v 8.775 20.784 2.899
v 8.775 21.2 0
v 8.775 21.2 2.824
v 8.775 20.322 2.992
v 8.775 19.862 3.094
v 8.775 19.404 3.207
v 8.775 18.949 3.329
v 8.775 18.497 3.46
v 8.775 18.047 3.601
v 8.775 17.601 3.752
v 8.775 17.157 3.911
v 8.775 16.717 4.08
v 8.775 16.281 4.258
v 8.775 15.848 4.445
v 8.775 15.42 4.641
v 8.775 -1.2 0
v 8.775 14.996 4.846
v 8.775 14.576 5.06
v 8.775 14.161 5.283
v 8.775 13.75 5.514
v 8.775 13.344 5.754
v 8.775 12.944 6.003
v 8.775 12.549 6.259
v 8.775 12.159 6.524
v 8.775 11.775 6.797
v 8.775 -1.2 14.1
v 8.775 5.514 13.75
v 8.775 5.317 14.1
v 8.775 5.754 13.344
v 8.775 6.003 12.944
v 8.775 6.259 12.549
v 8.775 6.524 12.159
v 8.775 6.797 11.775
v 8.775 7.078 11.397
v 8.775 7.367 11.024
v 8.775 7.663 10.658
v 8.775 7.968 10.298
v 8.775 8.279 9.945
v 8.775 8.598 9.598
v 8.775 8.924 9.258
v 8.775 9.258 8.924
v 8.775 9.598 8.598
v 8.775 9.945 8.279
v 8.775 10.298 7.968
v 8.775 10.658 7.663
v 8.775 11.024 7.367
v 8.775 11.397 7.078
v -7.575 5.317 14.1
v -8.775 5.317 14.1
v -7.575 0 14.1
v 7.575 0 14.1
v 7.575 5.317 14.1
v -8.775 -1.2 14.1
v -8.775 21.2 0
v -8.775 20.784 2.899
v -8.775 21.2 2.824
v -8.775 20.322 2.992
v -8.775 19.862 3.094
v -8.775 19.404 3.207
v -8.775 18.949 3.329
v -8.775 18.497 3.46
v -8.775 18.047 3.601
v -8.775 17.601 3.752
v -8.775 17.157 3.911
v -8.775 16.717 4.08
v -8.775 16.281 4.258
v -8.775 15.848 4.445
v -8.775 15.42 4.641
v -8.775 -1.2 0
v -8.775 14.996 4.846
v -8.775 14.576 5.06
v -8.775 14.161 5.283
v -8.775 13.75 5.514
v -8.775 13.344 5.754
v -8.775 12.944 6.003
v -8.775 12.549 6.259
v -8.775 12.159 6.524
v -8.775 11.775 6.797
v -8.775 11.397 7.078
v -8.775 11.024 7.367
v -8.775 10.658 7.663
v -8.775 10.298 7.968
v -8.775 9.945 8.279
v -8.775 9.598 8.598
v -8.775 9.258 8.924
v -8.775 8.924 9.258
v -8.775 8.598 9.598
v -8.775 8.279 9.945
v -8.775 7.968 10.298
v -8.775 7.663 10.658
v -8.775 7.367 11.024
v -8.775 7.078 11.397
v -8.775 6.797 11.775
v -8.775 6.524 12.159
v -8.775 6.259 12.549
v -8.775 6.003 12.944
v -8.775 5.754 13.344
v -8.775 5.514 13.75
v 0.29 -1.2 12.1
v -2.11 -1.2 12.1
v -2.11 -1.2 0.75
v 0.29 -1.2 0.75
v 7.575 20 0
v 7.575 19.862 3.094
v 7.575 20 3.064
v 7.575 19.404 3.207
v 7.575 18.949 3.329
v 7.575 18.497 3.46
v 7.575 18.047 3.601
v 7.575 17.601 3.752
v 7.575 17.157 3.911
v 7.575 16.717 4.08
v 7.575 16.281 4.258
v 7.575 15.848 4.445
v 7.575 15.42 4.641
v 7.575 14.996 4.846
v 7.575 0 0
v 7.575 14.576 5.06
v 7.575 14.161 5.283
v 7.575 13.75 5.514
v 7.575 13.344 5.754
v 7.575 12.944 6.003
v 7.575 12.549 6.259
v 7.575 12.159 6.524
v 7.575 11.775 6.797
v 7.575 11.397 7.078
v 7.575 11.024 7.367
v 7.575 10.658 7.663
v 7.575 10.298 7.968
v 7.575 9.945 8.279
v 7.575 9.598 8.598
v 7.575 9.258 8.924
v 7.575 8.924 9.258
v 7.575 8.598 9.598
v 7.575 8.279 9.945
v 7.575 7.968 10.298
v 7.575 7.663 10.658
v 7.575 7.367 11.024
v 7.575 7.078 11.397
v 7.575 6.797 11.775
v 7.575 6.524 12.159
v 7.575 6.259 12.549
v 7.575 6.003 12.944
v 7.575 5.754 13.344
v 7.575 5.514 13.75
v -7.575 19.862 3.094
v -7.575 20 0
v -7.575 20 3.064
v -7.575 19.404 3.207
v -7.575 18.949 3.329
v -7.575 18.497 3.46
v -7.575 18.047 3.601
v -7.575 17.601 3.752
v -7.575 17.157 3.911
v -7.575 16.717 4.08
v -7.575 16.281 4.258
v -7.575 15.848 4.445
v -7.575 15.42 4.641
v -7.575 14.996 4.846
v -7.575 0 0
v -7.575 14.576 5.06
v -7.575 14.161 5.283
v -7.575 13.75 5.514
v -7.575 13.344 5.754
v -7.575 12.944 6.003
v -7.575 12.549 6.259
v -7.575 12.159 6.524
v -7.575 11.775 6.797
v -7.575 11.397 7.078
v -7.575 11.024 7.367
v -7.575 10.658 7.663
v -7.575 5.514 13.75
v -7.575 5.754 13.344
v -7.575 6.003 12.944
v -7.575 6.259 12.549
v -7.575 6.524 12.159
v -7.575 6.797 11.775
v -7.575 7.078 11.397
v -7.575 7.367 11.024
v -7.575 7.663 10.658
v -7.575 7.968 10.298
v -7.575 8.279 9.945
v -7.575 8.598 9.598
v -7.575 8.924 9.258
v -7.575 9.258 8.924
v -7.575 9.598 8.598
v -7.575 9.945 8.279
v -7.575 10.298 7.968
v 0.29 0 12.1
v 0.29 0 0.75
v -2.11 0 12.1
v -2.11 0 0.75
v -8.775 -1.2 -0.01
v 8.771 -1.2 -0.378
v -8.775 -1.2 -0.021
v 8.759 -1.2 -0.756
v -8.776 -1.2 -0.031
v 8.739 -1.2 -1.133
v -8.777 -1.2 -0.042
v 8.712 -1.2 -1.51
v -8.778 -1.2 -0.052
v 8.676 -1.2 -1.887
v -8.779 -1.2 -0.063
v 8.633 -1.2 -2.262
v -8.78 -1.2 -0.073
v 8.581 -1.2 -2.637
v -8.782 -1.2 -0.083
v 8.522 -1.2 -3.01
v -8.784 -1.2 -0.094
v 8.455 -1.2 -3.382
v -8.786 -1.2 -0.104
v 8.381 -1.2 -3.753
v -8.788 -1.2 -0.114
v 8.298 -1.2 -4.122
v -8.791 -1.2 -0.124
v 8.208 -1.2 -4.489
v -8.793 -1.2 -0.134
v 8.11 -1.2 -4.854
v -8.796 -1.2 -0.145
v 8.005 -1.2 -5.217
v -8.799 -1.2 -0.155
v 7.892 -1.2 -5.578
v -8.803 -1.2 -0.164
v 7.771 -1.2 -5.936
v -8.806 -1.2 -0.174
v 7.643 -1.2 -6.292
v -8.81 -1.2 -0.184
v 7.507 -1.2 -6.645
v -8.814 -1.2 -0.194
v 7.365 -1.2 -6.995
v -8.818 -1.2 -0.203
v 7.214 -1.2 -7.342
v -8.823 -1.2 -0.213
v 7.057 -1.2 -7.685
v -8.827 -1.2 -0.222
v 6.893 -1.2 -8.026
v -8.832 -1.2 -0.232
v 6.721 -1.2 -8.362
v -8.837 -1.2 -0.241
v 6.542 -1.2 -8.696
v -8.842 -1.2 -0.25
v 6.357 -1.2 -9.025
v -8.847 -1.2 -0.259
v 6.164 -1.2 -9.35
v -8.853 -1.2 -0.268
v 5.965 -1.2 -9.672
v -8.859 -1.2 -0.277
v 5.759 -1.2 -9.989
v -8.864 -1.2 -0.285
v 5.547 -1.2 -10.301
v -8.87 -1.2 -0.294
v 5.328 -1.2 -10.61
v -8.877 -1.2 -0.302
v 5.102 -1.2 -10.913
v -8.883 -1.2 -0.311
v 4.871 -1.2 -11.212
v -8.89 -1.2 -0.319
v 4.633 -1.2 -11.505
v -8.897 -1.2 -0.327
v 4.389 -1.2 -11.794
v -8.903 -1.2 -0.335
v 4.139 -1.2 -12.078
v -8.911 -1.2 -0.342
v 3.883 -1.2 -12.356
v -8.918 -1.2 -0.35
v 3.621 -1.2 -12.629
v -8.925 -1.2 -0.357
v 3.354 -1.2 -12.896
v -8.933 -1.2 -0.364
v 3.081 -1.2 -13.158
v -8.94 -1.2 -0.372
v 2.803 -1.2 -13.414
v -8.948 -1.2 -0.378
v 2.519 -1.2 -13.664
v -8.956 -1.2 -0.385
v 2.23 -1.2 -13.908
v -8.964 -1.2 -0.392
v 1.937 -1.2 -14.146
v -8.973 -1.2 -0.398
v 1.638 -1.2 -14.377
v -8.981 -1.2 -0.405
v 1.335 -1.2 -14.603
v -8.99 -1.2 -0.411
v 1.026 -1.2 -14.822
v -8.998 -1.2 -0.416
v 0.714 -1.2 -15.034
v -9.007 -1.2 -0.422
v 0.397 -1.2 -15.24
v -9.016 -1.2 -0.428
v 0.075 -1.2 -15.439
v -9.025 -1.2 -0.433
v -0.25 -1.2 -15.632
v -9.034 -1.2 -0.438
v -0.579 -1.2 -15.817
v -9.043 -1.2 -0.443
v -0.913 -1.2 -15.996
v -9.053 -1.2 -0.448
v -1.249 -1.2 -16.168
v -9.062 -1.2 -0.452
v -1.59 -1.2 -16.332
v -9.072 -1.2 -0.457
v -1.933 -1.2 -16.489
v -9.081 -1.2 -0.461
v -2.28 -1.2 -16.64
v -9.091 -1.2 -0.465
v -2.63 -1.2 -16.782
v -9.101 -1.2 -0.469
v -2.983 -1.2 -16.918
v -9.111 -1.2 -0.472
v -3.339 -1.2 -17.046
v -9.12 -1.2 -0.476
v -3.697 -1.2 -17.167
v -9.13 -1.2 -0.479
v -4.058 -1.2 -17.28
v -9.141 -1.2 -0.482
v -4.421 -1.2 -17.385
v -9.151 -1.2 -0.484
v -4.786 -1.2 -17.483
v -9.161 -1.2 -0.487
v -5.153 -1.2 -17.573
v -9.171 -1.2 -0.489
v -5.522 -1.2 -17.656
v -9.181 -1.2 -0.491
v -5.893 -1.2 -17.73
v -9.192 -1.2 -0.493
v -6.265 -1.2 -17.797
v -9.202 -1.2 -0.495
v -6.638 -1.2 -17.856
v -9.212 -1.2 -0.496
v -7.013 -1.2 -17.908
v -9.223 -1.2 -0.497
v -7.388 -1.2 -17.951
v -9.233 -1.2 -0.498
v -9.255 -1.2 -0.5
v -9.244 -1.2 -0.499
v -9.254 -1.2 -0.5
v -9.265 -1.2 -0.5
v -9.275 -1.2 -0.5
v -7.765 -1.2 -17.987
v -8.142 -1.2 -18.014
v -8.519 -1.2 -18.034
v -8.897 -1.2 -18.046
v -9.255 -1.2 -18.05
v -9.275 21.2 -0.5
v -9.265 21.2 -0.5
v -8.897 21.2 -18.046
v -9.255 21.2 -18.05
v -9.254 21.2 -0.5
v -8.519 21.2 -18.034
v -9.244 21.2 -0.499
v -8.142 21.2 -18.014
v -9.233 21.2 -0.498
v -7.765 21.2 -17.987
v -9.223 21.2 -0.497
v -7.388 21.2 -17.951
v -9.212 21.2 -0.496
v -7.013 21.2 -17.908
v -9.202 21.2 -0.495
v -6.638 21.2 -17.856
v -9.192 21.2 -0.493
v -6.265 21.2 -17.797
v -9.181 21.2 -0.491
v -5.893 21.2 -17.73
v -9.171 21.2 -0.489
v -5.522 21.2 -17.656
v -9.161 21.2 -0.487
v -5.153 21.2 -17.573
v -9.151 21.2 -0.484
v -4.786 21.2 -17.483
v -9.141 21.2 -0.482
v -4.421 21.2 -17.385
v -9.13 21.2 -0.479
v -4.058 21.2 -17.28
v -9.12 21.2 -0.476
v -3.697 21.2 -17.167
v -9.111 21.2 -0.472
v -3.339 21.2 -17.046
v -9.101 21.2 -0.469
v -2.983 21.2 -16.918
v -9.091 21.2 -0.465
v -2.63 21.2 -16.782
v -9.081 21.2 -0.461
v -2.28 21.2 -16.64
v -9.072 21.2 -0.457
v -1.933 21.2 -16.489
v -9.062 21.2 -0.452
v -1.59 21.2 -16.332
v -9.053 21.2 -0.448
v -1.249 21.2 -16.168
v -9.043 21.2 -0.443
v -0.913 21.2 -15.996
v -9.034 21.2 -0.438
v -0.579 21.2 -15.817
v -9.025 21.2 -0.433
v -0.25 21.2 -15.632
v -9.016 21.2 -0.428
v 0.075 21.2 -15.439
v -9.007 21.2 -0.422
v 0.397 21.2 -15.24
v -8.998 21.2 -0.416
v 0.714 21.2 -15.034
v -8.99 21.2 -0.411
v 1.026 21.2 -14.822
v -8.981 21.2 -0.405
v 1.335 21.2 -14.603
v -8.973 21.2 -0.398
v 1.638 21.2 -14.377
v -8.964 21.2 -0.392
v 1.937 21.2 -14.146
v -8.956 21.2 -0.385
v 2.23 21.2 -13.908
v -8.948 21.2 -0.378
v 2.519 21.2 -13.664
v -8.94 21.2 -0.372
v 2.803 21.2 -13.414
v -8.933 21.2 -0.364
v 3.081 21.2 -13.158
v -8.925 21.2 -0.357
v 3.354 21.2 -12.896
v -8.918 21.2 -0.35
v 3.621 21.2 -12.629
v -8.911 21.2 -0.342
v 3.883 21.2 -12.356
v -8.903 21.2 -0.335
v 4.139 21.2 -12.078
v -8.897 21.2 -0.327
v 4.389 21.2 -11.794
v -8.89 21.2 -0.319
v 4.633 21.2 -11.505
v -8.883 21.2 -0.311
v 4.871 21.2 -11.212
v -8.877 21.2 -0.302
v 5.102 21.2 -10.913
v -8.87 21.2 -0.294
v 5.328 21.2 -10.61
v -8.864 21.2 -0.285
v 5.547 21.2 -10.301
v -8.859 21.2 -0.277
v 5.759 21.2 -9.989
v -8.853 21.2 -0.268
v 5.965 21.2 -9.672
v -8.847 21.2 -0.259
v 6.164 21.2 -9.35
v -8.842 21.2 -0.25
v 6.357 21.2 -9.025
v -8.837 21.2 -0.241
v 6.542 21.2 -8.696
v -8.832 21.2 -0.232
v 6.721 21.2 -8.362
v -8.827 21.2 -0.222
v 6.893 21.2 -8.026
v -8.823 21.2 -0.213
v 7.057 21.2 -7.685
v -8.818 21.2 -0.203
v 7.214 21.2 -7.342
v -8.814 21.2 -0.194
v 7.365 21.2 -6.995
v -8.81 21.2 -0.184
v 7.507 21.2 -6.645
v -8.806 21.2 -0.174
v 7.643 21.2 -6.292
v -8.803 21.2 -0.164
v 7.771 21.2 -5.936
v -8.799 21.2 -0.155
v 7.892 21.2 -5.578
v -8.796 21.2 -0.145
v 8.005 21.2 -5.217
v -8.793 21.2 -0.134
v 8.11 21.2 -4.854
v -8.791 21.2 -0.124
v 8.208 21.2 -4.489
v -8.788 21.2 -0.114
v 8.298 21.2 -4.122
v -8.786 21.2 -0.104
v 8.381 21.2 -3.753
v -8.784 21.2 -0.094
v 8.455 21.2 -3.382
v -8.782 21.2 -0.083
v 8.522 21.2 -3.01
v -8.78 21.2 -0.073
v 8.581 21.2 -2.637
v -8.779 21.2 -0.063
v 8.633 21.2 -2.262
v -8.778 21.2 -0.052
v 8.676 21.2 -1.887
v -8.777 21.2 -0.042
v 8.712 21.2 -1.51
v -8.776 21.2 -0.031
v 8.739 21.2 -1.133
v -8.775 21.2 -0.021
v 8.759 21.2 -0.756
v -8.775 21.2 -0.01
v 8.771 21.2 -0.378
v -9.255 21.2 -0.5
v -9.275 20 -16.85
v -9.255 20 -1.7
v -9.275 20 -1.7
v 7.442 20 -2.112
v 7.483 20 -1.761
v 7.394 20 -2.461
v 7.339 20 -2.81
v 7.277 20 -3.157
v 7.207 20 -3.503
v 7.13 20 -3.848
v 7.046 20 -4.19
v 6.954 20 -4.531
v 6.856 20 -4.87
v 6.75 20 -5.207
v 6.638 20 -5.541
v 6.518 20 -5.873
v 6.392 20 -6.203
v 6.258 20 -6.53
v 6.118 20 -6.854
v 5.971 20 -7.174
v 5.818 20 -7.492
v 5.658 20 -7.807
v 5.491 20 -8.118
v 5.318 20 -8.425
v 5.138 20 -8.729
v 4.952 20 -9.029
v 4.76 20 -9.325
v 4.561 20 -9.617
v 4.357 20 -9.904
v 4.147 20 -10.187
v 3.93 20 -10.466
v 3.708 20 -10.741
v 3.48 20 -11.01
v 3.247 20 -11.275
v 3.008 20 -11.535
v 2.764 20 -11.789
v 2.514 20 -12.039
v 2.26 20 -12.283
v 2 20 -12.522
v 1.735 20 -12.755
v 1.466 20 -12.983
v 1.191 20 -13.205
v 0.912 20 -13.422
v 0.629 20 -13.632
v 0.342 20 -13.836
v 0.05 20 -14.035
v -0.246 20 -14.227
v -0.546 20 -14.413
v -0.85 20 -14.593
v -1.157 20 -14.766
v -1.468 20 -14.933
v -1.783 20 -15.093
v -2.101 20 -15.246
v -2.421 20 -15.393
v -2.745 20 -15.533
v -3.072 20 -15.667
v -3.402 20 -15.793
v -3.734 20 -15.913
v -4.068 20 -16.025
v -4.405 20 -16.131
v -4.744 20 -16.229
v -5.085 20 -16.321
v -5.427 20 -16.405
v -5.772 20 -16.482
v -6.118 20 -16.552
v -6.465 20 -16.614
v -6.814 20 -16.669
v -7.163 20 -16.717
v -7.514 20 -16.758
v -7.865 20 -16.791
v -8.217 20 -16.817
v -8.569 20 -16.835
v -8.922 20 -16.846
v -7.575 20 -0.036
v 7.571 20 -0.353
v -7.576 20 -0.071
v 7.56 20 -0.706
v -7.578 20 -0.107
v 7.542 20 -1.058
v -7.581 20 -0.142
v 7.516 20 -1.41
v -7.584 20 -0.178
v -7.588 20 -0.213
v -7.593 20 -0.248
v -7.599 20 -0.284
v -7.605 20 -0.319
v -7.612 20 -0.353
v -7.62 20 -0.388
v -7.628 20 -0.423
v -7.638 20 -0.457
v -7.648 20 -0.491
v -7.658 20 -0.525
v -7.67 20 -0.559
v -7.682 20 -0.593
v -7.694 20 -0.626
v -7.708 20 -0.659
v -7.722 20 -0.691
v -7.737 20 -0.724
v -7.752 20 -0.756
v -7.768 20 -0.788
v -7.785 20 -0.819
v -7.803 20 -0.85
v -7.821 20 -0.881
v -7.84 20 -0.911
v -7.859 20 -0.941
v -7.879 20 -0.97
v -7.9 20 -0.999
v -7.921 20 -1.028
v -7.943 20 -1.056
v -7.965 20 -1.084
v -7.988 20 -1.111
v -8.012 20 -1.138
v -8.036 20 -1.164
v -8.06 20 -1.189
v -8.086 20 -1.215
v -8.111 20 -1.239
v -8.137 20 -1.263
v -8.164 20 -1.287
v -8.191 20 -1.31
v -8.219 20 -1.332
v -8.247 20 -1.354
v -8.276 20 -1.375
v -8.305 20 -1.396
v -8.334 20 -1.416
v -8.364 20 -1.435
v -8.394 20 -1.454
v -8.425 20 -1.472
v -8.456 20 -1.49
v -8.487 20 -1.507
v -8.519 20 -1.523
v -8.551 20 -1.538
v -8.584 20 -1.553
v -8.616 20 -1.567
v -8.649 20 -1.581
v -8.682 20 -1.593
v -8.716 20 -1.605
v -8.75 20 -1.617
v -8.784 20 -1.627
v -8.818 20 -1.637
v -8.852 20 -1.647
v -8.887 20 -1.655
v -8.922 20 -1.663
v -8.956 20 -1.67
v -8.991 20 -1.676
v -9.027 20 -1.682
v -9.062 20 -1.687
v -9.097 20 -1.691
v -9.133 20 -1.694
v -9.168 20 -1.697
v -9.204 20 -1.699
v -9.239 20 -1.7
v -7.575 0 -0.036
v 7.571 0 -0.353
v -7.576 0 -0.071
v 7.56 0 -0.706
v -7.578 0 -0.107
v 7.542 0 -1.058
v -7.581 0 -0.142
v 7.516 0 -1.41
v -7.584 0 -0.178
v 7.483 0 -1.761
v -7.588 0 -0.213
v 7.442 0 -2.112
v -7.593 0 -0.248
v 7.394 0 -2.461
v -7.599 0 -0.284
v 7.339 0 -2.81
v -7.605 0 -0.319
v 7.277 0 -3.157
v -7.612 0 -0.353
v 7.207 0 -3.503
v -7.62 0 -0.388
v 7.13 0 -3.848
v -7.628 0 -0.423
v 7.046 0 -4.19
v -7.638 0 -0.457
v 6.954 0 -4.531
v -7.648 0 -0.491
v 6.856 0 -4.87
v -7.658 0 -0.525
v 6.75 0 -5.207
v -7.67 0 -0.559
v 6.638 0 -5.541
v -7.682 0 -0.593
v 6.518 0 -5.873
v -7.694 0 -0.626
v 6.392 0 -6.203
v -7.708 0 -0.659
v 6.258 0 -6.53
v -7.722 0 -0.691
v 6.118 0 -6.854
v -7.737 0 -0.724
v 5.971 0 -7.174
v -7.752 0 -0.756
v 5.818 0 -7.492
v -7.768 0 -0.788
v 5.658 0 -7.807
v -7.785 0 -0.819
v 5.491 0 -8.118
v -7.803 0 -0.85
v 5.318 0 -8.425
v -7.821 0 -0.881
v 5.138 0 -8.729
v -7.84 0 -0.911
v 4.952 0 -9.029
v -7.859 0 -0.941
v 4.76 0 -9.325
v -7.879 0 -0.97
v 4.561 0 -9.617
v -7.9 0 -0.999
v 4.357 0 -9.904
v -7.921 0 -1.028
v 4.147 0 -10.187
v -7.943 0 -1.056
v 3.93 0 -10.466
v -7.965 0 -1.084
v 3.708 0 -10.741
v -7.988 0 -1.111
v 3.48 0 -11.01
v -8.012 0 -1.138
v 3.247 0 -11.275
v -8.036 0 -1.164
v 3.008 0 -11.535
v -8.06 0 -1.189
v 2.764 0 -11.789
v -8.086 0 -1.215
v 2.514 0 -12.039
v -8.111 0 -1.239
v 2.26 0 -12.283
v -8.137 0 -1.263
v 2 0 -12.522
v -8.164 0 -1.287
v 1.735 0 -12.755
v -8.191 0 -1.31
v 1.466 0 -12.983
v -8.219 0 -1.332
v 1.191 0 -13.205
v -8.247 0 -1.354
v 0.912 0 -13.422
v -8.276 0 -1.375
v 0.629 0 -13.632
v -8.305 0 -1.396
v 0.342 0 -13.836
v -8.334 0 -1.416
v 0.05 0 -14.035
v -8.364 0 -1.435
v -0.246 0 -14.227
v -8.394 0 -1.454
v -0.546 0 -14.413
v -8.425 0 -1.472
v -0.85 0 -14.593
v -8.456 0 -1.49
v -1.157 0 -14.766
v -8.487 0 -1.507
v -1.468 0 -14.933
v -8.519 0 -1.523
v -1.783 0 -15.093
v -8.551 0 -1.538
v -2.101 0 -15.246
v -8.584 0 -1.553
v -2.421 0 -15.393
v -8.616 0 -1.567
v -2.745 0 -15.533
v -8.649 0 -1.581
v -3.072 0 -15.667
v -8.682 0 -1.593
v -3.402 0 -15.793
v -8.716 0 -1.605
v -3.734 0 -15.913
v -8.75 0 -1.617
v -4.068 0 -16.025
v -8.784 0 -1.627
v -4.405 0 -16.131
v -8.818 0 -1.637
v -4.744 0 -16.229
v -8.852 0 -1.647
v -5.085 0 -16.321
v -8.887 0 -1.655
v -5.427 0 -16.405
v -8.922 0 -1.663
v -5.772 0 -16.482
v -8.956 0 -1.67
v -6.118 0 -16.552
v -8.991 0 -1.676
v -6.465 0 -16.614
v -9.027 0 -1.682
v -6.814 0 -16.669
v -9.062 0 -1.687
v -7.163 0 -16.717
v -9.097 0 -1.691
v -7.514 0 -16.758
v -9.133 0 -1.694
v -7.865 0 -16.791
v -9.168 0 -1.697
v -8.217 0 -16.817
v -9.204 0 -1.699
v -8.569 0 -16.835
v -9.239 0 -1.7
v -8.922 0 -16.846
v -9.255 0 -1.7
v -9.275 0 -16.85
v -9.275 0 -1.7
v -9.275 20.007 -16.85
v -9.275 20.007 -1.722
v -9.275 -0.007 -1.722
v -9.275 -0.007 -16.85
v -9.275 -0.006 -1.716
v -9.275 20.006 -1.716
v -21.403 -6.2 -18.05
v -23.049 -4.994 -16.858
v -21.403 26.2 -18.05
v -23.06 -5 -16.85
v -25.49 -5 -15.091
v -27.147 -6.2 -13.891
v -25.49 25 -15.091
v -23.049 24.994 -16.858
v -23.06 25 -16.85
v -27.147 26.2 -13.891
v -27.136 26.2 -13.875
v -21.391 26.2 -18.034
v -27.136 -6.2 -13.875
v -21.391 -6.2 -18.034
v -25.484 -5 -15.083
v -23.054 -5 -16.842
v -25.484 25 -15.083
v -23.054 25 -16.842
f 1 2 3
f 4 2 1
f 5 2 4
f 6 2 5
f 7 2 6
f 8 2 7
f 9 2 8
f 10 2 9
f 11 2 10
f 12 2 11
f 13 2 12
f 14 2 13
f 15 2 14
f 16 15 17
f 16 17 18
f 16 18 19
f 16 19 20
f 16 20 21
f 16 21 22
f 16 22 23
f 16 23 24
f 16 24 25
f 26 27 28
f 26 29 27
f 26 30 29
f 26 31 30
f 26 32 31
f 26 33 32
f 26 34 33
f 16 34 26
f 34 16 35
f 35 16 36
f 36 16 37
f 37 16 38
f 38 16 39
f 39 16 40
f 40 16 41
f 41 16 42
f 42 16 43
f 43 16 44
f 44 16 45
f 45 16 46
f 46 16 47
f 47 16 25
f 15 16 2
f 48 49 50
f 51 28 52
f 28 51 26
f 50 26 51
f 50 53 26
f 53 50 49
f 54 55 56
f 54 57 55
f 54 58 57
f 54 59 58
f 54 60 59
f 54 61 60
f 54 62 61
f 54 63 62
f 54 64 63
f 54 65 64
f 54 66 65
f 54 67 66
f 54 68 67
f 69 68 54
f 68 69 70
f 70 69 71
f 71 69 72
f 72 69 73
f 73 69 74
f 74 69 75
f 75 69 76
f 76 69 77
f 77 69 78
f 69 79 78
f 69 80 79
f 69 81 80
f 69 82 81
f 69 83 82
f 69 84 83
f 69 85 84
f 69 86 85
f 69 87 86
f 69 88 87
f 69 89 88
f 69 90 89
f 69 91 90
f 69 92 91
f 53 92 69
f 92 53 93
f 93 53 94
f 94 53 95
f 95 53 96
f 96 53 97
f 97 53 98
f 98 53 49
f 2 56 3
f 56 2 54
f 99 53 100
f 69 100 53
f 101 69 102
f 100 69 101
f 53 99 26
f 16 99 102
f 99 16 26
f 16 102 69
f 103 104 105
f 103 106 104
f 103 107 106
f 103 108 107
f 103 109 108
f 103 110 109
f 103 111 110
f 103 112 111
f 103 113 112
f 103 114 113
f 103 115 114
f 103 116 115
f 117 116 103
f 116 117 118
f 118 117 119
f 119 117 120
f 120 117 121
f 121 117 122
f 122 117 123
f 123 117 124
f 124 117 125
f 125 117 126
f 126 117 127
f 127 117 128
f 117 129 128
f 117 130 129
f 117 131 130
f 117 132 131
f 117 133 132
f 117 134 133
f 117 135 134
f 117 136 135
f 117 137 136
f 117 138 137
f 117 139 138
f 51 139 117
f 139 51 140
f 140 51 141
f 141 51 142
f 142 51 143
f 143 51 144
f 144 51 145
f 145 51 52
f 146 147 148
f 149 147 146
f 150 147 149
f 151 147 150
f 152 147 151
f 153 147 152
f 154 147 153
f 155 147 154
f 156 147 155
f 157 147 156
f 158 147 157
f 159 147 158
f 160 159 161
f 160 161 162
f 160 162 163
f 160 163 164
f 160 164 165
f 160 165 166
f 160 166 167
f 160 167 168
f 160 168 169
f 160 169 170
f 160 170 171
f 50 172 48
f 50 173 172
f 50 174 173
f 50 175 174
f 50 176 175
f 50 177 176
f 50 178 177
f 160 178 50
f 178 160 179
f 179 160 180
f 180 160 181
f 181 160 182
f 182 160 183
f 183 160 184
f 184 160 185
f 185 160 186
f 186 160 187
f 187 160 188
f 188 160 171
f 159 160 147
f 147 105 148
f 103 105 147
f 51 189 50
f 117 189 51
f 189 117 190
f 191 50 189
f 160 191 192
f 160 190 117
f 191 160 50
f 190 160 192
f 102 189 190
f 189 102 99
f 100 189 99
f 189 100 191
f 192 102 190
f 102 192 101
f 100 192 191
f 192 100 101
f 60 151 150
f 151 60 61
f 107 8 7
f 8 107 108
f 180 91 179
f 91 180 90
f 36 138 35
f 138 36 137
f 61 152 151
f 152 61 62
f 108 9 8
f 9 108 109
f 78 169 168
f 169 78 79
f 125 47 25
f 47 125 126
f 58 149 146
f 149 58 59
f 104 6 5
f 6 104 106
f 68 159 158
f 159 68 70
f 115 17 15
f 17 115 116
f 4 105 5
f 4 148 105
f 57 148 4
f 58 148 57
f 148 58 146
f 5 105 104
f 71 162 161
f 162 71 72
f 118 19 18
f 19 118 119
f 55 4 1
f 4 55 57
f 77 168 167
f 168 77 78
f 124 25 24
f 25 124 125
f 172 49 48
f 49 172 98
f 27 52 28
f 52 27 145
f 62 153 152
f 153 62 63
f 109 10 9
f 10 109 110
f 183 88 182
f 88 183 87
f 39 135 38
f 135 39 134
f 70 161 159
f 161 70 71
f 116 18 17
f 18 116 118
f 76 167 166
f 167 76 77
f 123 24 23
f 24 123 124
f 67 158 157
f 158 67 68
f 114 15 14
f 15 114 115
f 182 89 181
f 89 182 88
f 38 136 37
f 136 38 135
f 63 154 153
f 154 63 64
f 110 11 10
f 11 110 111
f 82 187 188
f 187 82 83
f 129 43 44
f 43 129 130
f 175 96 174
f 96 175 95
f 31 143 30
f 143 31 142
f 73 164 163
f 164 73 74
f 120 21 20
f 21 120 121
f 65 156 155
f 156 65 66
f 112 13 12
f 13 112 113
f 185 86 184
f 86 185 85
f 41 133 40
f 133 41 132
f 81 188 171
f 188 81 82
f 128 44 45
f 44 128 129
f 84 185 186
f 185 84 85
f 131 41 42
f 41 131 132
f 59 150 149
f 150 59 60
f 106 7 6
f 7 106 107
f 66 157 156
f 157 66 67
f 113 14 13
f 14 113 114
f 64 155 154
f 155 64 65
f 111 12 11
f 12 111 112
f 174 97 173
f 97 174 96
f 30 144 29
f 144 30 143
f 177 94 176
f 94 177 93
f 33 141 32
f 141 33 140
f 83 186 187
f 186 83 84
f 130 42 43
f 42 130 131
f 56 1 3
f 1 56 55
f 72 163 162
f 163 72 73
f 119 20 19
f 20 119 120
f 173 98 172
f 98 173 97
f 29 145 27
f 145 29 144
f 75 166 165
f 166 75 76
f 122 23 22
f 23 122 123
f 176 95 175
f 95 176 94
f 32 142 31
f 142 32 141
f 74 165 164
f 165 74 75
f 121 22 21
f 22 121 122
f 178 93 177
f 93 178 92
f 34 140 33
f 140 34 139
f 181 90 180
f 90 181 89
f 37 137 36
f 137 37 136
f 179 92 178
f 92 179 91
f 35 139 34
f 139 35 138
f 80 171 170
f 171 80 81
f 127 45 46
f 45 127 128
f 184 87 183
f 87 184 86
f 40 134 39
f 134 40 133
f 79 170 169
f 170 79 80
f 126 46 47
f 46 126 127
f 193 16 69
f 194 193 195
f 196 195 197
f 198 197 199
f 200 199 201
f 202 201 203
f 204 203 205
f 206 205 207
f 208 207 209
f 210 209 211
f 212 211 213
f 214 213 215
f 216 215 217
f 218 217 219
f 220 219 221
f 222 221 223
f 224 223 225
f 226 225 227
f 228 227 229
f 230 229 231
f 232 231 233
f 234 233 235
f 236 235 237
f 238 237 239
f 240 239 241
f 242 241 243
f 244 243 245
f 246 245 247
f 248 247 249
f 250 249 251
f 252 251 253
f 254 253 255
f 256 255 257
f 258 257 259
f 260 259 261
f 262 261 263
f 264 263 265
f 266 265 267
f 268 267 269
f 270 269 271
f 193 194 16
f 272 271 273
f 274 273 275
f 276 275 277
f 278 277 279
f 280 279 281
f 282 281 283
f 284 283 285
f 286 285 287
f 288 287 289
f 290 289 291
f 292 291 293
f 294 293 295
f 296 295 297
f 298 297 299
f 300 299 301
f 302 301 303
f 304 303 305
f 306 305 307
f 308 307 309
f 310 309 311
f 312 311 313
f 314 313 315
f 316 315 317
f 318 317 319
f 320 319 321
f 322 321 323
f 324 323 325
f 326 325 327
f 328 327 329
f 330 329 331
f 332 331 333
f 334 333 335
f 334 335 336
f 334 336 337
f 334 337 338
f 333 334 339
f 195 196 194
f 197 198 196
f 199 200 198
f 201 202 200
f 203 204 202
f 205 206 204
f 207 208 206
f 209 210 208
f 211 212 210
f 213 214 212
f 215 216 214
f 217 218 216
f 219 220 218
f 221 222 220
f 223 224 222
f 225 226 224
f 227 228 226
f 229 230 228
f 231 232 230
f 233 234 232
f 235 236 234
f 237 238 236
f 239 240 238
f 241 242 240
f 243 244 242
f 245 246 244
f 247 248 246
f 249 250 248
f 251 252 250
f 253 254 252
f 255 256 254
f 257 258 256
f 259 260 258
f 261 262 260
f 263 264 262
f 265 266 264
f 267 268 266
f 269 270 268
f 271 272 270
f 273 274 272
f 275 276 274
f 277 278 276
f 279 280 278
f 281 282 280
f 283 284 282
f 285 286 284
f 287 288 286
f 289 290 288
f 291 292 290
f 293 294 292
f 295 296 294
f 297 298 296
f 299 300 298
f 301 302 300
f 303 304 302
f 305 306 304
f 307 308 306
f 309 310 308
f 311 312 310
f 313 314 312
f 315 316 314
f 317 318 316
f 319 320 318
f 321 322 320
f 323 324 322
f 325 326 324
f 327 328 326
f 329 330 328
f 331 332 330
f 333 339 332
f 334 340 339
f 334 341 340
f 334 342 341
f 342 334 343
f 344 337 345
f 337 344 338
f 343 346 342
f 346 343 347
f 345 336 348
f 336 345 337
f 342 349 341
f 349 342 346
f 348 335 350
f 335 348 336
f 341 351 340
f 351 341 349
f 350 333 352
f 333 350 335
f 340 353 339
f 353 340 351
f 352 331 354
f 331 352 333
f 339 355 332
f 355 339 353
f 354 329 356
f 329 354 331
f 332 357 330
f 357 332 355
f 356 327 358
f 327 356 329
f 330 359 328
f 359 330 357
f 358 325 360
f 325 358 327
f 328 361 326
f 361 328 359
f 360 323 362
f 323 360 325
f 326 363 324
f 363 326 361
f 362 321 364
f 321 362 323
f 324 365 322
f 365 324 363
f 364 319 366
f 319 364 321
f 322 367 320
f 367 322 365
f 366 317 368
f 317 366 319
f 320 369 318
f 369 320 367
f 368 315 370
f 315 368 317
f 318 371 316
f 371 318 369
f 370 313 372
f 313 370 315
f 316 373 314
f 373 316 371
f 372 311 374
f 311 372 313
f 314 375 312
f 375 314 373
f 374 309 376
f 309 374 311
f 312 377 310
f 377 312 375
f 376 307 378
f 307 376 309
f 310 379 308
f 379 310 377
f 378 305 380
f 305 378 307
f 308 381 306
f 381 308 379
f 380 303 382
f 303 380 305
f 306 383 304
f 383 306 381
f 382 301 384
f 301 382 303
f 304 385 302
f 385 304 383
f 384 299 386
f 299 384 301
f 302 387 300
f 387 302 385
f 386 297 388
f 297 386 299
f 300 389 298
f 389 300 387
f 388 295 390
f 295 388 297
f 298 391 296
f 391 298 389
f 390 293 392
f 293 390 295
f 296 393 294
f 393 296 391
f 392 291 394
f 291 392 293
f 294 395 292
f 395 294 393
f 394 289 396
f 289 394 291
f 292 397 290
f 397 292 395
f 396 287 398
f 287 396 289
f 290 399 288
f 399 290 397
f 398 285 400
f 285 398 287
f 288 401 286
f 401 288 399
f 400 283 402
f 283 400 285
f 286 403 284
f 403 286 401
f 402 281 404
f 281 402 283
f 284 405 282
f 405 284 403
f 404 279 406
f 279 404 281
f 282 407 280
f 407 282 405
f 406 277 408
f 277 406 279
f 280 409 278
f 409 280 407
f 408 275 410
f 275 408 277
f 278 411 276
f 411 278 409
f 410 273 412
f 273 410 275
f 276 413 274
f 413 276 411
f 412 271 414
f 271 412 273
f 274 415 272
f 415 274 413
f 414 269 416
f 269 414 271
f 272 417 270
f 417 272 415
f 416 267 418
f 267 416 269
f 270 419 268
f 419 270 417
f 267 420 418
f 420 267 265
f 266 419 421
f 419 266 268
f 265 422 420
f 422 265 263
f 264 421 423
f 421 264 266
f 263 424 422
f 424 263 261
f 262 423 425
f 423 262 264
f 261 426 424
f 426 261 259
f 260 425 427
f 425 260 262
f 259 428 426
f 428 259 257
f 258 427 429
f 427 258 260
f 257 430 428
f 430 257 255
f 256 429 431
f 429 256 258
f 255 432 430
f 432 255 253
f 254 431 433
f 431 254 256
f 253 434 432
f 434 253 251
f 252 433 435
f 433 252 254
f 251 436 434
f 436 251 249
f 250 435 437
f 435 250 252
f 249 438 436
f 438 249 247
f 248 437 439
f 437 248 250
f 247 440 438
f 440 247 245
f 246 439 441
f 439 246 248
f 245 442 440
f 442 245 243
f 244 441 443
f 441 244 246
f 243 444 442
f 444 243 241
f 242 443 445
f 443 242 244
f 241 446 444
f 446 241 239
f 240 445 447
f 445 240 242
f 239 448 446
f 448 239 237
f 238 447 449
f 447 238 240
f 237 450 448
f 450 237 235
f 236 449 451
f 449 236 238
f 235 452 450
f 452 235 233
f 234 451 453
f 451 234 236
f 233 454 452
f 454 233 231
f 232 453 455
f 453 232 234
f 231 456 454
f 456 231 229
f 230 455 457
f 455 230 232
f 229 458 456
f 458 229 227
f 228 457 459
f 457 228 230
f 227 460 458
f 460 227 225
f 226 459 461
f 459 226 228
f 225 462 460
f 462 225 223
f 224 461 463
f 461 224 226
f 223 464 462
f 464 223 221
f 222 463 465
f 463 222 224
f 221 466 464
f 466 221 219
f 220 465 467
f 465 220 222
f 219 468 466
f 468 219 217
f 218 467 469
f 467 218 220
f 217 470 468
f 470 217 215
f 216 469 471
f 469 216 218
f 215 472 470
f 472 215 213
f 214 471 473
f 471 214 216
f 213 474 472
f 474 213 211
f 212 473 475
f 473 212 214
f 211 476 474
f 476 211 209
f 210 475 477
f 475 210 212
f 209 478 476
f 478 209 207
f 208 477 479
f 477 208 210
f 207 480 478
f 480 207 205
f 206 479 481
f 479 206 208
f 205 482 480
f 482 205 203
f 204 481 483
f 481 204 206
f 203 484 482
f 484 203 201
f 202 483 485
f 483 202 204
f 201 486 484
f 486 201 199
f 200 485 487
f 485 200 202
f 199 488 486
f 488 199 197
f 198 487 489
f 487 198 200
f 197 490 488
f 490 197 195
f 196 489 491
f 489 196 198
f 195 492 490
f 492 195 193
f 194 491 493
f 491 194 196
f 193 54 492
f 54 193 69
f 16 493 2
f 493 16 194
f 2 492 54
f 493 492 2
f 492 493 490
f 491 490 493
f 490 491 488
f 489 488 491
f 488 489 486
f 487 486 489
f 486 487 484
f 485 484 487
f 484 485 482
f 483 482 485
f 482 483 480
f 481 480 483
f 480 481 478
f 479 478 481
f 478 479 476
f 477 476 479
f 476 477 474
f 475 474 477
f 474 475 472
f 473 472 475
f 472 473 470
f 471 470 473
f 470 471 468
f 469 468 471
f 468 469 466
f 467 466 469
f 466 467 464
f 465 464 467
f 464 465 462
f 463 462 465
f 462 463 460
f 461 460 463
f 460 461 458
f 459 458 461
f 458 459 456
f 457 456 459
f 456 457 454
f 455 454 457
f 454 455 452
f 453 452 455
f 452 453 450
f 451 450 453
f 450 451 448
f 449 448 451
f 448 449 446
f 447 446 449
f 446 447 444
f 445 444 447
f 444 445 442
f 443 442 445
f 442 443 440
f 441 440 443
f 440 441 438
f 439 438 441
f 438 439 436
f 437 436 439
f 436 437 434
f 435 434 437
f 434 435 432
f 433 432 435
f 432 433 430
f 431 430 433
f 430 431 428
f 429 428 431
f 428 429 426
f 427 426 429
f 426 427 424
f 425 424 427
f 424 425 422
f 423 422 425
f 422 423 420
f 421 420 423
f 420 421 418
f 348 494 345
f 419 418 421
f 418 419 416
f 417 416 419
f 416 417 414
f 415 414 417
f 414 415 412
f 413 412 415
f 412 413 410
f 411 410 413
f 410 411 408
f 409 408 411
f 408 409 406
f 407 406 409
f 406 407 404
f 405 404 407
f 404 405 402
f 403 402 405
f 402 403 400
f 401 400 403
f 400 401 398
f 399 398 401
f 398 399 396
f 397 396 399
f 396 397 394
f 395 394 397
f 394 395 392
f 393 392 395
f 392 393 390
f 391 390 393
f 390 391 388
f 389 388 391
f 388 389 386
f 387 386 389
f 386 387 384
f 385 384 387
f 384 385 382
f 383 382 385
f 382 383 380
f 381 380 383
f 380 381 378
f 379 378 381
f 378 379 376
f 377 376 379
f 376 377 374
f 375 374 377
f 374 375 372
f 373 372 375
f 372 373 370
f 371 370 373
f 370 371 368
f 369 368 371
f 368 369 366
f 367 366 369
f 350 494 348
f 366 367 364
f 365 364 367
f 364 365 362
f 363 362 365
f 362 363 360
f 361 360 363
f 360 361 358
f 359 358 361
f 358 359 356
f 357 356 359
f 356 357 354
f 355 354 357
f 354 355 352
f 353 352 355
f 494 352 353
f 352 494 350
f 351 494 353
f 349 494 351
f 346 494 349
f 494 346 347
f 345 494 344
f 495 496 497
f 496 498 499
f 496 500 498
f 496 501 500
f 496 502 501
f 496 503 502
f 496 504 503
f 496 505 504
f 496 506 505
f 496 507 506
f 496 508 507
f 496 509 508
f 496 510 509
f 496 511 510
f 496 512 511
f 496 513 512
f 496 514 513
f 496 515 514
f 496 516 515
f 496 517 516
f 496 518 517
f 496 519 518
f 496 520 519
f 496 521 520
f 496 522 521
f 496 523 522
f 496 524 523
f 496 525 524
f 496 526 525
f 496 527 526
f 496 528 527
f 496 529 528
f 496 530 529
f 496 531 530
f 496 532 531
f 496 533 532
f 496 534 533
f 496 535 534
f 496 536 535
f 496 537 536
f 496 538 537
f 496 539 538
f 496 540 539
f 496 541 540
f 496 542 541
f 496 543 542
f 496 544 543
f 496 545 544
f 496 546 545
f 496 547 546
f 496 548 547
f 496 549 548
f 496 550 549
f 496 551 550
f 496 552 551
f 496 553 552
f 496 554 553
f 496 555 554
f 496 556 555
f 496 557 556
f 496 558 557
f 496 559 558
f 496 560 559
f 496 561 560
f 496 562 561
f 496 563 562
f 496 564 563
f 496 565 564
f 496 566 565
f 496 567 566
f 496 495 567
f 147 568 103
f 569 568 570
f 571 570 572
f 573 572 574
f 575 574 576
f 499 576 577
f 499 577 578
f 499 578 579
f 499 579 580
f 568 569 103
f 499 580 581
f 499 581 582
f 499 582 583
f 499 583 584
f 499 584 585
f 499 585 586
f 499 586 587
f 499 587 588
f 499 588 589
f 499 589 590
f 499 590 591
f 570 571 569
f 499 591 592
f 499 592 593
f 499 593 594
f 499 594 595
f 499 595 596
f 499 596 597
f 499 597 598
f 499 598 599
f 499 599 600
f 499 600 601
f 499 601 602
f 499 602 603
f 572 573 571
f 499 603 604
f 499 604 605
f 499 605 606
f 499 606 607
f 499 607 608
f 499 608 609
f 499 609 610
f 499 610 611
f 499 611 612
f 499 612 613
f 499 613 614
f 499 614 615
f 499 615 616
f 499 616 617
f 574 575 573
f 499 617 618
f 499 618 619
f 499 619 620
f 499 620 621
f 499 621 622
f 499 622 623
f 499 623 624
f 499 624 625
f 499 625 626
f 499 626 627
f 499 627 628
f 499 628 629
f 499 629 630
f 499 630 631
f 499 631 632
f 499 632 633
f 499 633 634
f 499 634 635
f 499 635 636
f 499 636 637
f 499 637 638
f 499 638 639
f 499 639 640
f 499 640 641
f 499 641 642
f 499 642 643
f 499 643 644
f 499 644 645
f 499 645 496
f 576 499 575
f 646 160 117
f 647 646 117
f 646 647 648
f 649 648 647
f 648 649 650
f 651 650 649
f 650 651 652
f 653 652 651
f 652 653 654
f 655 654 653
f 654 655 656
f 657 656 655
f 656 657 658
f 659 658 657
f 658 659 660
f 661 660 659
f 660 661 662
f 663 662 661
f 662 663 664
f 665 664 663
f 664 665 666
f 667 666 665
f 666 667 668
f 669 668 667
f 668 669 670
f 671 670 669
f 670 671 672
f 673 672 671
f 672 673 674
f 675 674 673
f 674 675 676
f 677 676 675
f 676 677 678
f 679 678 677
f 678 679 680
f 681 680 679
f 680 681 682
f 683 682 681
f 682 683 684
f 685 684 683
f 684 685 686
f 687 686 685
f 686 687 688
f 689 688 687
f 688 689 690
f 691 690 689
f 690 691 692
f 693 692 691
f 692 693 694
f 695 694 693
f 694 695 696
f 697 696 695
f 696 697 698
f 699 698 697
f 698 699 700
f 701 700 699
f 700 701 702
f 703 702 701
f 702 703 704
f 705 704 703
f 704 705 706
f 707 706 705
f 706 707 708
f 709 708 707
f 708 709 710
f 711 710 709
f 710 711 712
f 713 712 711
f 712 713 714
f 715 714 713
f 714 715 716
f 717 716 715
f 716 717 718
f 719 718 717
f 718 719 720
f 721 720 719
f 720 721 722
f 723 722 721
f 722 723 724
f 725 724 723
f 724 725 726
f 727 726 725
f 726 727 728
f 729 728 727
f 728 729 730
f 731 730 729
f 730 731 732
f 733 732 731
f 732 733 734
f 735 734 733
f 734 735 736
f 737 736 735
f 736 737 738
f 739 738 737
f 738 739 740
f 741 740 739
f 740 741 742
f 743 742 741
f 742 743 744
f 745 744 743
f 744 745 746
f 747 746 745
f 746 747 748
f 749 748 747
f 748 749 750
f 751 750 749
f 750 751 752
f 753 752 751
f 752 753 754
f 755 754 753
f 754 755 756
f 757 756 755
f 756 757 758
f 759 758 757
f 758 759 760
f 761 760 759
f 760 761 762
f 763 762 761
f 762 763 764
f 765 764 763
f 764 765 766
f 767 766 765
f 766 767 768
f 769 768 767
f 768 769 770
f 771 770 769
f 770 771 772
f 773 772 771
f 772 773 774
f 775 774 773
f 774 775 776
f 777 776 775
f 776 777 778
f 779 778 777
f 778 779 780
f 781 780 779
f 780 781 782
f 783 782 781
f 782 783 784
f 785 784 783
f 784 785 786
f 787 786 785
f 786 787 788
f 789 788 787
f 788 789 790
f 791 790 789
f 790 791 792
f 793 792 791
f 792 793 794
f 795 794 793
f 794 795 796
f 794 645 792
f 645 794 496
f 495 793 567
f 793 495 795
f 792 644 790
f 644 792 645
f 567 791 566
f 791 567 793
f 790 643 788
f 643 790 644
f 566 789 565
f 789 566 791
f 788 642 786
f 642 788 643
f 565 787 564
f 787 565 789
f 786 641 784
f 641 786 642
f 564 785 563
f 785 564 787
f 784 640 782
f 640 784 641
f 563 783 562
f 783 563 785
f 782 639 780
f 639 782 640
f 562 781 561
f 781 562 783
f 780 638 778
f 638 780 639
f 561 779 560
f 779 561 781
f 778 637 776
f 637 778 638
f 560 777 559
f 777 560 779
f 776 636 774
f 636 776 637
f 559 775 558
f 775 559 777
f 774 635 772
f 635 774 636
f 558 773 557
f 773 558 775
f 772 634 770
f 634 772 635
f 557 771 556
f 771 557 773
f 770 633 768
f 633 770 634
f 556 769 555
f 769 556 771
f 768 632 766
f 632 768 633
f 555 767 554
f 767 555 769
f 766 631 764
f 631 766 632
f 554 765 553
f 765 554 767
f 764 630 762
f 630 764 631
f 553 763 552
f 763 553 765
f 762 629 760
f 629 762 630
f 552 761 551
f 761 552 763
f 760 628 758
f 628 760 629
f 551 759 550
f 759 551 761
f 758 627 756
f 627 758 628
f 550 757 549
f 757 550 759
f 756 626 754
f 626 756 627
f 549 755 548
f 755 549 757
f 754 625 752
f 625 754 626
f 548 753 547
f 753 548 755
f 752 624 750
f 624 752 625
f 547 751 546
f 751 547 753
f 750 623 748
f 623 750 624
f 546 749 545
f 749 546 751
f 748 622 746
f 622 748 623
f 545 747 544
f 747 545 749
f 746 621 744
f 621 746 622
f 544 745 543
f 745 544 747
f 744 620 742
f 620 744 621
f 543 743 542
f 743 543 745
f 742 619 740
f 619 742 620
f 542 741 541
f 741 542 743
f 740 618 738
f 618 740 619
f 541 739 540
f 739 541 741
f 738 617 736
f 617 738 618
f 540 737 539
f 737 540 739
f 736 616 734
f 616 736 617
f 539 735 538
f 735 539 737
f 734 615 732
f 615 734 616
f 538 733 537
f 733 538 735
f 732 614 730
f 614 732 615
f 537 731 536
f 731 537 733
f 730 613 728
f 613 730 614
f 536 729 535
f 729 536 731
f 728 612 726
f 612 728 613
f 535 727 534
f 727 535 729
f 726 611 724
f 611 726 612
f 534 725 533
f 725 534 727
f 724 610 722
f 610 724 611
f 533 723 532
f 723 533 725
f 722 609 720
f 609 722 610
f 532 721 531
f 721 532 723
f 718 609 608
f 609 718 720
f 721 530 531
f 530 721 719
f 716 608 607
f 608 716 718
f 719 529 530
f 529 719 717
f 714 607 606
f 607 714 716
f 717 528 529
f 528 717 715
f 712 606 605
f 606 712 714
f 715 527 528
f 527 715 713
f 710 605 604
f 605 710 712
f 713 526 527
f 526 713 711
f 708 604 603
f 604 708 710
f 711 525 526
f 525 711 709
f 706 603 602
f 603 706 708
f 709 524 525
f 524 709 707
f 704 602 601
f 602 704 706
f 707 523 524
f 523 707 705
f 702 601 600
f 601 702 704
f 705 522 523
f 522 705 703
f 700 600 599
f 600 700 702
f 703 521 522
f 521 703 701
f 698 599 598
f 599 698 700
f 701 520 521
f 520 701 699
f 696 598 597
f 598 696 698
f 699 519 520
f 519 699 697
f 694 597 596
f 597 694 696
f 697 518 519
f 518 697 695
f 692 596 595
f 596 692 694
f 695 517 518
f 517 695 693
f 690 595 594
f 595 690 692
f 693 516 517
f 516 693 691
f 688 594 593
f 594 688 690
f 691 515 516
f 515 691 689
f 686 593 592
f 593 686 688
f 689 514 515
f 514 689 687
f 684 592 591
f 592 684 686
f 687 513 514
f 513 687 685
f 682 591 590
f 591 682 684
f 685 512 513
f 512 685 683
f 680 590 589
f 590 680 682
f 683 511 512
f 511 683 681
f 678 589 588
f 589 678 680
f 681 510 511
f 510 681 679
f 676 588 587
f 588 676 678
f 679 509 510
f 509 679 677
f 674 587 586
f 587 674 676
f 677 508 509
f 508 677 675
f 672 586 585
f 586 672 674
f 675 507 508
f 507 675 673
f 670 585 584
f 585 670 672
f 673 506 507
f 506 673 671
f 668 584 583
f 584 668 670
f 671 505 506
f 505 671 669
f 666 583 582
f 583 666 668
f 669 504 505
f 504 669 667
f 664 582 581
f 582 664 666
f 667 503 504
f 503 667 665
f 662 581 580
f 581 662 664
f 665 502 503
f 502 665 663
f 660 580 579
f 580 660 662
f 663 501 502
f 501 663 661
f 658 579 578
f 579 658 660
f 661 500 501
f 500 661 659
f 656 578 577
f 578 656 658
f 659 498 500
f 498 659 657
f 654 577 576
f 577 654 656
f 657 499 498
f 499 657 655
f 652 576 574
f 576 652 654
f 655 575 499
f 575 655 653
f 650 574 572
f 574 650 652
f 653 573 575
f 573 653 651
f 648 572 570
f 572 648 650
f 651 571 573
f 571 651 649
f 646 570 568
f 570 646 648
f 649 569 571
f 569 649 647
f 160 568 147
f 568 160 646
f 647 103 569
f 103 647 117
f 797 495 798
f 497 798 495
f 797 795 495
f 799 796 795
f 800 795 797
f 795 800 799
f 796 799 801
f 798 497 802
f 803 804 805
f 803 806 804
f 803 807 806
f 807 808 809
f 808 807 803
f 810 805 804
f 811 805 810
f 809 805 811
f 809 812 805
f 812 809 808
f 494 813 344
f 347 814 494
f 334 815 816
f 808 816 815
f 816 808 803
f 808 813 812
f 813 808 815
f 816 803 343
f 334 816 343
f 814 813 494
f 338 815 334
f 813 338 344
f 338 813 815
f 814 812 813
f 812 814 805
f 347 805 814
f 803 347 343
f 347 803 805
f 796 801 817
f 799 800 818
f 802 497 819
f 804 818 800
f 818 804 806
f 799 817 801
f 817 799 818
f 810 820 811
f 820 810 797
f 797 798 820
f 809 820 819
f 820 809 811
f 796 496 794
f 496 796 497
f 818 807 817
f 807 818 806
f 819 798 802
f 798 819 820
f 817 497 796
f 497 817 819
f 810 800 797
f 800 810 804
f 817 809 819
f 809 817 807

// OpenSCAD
/* [Fan Duct General] */
//Dimensions of fan duct outlet
outlet_width = 30;
outlet_height = 3;
automatic_outlet_angle = true;
outlet_angle = 0;
// Choose outlet angle
// How far from elbow is the tip?
tip_length = 15;
// How far from elbow is the fan outlet?
fan_elevation = 0;
// Choose duct angle
angle = 90;
/* [Fan Duct Advanced] */
elbow_radius = 0.5;
// thickess of printed duct
thickness = 1.2;
// Level of detail
fn=300;
/* [5015 Fan characteristics] */
// Width of the outlet on the fan itself
fan_outlet_width  = 20;
// Height of the outlet on the fan itself
fan_outlet_height = 15.15;
// Location and dimensions of notch for snap fit.  Don't change unless different fan type
notch_height = 11.35; 
notch_width = 2.4;
// Notch is not centered, this value represents how far from center it is
notch_offset = 0.91; 
// How far from edge is the notch
notch_elevation = 0.75;

// Offsets for center of fan for relief cut into fan duct
cy = 25;
cz = 25;
r = 22.5;




fan_duct(
    outlet_width = outlet_width,
    outlet_height = outlet_height,
    automatic_outlet_angle = automatic_outlet_angle,
    outlet_angle = outlet_angle,
    tip_length = tip_length,
    angle = angle,
    fan_elevation = fan_elevation,
    elbow_radius = elbow_radius,
    thickness = thickness,
    fan_outlet_width  = fan_outlet_width ,
    fan_outlet_height = fan_outlet_height,
    notch_height = notch_height, 
    notch_width = notch_width,
    notch_offset = notch_offset, 
    notch_elevation = notch_elevation,
    cy = cy,
    cz = cz,
    r = r,
    $fn = fn);

module fan_duct(
    outlet_width = 30,
    outlet_height = 3,
    automatic_outlet_angle = true,
    outlet_angle = 0,
    tip_length = 30,
    angle = 90,
    elbow_radius = 0.01,
    thickness = 1.2,
    fan_outlet_width  = 20,
    fan_outlet_height = 15.15,
    fan_elevation = 0,
    notch_height = 10.85, 
    notch_width = 1.9,
    notch_offset = 0.91, 
    notch_elevation = 1,
    tip_angle = undef,
    cy = 25,
    cz = 25,
    r = 22.5,
    $fn=300)
{

    module duct_inner() {
      square([fan_outlet_height, fan_outlet_width ]);  
    }

    module duct_outer() {
      translate([-thickness,-thickness]) square([fan_outlet_height + thickness*2, fan_outlet_width  + thickness * 2]);  
    }

    module fan_nozzle_tip_inner() {
      translate([-outlet_height/2,0]) square([outlet_height, outlet_width]);  
    }

    module fan_nozzle_tip_outer() {
      th = thickness / cos(tip_angle);
      translate([-outlet_height/2-th,-thickness]) square([outlet_height + th*2, outlet_width + thickness*2]);  
    }

    module fan_fit() {
      fit_heigth = fan_elevation+notch_elevation+notch_height+2;
      difference(){
        translate([-fan_outlet_height/2,0]) 
            difference() {
                translate([-thickness,-thickness]) 
                    cube([fan_outlet_height + thickness*2, fan_outlet_width  + thickness * 2, fit_heigth]);
                translate([0,0,-1]) 
                    cube([fan_outlet_height, fan_outlet_width , fit_heigth+2]);
            }
        translate([-notch_width/2-notch_offset,-notch_height/2,fan_elevation+notch_elevation]) 
          cube([notch_width,fan_outlet_width /2,notch_height]);
        translate([0,cy,fan_elevation+cz]) 
          rotate([0,90,0]) cylinder(r=r, h=fan_outlet_height*2,center=true);
      }
    }

    module fan_elbow() {
      x = (fan_outlet_height+thickness*2+elbow_radius)*2;
      translate([-elbow_radius-fan_outlet_height/2-thickness,0]) 
        difference() {
          rotate([-90,0,0])
            rotate_extrude(convexity=10) 
              translate([elbow_radius+thickness,0,0]) difference() {
                  duct_outer();
                  duct_inner();
                }
          translate([0,0,x/2]) cube([x,(fan_outlet_width +thickness*2)*2,x], center=true);
          rotate([0,angle-90,0]) translate([-x/2,0,0]) cube([x,(fan_outlet_width +thickness*2)*2,x], center=true);
        }
    }

    module fan_nozzle() {
        translate([-elbow_radius-thickness-fan_outlet_height/2,0])
            rotate([0,angle,0])
                translate([elbow_radius+thickness,0,0])   
                    difference() {
                        hull() {
                            linear_extrude(0.02)
                                duct_outer();
                            translate([fan_outlet_height-cos(tip_angle)*(outlet_height)/2,(fan_outlet_width -outlet_width)/2,-tip_length]) 
                                rotate([0,-tip_angle,0]) 
                                    linear_extrude(0.02) fan_nozzle_tip_outer();
                        }
                        hull() {
                            linear_extrude(0.02)
                                duct_inner();
                            translate([fan_outlet_height-cos(tip_angle)*outlet_height/2,(fan_outlet_width -outlet_width)/2,-tip_length]) 
                                rotate([0,-tip_angle,0]) // angle the tip
                                    translate([0,0,-0.01]) linear_extrude(0.02) 
                                        fan_nozzle_tip_inner();
                        }
      }
    }
   tip_angle = (automatic_outlet_angle) ? asin((fan_outlet_height - outlet_height) / tip_length) : outlet_angle;

  rotate([0,90-angle,0]) {
    translate([0,0,-fan_elevation]) {
        fan_fit();
        fan_elbow();
        fan_nozzle();
    }
  }

}
